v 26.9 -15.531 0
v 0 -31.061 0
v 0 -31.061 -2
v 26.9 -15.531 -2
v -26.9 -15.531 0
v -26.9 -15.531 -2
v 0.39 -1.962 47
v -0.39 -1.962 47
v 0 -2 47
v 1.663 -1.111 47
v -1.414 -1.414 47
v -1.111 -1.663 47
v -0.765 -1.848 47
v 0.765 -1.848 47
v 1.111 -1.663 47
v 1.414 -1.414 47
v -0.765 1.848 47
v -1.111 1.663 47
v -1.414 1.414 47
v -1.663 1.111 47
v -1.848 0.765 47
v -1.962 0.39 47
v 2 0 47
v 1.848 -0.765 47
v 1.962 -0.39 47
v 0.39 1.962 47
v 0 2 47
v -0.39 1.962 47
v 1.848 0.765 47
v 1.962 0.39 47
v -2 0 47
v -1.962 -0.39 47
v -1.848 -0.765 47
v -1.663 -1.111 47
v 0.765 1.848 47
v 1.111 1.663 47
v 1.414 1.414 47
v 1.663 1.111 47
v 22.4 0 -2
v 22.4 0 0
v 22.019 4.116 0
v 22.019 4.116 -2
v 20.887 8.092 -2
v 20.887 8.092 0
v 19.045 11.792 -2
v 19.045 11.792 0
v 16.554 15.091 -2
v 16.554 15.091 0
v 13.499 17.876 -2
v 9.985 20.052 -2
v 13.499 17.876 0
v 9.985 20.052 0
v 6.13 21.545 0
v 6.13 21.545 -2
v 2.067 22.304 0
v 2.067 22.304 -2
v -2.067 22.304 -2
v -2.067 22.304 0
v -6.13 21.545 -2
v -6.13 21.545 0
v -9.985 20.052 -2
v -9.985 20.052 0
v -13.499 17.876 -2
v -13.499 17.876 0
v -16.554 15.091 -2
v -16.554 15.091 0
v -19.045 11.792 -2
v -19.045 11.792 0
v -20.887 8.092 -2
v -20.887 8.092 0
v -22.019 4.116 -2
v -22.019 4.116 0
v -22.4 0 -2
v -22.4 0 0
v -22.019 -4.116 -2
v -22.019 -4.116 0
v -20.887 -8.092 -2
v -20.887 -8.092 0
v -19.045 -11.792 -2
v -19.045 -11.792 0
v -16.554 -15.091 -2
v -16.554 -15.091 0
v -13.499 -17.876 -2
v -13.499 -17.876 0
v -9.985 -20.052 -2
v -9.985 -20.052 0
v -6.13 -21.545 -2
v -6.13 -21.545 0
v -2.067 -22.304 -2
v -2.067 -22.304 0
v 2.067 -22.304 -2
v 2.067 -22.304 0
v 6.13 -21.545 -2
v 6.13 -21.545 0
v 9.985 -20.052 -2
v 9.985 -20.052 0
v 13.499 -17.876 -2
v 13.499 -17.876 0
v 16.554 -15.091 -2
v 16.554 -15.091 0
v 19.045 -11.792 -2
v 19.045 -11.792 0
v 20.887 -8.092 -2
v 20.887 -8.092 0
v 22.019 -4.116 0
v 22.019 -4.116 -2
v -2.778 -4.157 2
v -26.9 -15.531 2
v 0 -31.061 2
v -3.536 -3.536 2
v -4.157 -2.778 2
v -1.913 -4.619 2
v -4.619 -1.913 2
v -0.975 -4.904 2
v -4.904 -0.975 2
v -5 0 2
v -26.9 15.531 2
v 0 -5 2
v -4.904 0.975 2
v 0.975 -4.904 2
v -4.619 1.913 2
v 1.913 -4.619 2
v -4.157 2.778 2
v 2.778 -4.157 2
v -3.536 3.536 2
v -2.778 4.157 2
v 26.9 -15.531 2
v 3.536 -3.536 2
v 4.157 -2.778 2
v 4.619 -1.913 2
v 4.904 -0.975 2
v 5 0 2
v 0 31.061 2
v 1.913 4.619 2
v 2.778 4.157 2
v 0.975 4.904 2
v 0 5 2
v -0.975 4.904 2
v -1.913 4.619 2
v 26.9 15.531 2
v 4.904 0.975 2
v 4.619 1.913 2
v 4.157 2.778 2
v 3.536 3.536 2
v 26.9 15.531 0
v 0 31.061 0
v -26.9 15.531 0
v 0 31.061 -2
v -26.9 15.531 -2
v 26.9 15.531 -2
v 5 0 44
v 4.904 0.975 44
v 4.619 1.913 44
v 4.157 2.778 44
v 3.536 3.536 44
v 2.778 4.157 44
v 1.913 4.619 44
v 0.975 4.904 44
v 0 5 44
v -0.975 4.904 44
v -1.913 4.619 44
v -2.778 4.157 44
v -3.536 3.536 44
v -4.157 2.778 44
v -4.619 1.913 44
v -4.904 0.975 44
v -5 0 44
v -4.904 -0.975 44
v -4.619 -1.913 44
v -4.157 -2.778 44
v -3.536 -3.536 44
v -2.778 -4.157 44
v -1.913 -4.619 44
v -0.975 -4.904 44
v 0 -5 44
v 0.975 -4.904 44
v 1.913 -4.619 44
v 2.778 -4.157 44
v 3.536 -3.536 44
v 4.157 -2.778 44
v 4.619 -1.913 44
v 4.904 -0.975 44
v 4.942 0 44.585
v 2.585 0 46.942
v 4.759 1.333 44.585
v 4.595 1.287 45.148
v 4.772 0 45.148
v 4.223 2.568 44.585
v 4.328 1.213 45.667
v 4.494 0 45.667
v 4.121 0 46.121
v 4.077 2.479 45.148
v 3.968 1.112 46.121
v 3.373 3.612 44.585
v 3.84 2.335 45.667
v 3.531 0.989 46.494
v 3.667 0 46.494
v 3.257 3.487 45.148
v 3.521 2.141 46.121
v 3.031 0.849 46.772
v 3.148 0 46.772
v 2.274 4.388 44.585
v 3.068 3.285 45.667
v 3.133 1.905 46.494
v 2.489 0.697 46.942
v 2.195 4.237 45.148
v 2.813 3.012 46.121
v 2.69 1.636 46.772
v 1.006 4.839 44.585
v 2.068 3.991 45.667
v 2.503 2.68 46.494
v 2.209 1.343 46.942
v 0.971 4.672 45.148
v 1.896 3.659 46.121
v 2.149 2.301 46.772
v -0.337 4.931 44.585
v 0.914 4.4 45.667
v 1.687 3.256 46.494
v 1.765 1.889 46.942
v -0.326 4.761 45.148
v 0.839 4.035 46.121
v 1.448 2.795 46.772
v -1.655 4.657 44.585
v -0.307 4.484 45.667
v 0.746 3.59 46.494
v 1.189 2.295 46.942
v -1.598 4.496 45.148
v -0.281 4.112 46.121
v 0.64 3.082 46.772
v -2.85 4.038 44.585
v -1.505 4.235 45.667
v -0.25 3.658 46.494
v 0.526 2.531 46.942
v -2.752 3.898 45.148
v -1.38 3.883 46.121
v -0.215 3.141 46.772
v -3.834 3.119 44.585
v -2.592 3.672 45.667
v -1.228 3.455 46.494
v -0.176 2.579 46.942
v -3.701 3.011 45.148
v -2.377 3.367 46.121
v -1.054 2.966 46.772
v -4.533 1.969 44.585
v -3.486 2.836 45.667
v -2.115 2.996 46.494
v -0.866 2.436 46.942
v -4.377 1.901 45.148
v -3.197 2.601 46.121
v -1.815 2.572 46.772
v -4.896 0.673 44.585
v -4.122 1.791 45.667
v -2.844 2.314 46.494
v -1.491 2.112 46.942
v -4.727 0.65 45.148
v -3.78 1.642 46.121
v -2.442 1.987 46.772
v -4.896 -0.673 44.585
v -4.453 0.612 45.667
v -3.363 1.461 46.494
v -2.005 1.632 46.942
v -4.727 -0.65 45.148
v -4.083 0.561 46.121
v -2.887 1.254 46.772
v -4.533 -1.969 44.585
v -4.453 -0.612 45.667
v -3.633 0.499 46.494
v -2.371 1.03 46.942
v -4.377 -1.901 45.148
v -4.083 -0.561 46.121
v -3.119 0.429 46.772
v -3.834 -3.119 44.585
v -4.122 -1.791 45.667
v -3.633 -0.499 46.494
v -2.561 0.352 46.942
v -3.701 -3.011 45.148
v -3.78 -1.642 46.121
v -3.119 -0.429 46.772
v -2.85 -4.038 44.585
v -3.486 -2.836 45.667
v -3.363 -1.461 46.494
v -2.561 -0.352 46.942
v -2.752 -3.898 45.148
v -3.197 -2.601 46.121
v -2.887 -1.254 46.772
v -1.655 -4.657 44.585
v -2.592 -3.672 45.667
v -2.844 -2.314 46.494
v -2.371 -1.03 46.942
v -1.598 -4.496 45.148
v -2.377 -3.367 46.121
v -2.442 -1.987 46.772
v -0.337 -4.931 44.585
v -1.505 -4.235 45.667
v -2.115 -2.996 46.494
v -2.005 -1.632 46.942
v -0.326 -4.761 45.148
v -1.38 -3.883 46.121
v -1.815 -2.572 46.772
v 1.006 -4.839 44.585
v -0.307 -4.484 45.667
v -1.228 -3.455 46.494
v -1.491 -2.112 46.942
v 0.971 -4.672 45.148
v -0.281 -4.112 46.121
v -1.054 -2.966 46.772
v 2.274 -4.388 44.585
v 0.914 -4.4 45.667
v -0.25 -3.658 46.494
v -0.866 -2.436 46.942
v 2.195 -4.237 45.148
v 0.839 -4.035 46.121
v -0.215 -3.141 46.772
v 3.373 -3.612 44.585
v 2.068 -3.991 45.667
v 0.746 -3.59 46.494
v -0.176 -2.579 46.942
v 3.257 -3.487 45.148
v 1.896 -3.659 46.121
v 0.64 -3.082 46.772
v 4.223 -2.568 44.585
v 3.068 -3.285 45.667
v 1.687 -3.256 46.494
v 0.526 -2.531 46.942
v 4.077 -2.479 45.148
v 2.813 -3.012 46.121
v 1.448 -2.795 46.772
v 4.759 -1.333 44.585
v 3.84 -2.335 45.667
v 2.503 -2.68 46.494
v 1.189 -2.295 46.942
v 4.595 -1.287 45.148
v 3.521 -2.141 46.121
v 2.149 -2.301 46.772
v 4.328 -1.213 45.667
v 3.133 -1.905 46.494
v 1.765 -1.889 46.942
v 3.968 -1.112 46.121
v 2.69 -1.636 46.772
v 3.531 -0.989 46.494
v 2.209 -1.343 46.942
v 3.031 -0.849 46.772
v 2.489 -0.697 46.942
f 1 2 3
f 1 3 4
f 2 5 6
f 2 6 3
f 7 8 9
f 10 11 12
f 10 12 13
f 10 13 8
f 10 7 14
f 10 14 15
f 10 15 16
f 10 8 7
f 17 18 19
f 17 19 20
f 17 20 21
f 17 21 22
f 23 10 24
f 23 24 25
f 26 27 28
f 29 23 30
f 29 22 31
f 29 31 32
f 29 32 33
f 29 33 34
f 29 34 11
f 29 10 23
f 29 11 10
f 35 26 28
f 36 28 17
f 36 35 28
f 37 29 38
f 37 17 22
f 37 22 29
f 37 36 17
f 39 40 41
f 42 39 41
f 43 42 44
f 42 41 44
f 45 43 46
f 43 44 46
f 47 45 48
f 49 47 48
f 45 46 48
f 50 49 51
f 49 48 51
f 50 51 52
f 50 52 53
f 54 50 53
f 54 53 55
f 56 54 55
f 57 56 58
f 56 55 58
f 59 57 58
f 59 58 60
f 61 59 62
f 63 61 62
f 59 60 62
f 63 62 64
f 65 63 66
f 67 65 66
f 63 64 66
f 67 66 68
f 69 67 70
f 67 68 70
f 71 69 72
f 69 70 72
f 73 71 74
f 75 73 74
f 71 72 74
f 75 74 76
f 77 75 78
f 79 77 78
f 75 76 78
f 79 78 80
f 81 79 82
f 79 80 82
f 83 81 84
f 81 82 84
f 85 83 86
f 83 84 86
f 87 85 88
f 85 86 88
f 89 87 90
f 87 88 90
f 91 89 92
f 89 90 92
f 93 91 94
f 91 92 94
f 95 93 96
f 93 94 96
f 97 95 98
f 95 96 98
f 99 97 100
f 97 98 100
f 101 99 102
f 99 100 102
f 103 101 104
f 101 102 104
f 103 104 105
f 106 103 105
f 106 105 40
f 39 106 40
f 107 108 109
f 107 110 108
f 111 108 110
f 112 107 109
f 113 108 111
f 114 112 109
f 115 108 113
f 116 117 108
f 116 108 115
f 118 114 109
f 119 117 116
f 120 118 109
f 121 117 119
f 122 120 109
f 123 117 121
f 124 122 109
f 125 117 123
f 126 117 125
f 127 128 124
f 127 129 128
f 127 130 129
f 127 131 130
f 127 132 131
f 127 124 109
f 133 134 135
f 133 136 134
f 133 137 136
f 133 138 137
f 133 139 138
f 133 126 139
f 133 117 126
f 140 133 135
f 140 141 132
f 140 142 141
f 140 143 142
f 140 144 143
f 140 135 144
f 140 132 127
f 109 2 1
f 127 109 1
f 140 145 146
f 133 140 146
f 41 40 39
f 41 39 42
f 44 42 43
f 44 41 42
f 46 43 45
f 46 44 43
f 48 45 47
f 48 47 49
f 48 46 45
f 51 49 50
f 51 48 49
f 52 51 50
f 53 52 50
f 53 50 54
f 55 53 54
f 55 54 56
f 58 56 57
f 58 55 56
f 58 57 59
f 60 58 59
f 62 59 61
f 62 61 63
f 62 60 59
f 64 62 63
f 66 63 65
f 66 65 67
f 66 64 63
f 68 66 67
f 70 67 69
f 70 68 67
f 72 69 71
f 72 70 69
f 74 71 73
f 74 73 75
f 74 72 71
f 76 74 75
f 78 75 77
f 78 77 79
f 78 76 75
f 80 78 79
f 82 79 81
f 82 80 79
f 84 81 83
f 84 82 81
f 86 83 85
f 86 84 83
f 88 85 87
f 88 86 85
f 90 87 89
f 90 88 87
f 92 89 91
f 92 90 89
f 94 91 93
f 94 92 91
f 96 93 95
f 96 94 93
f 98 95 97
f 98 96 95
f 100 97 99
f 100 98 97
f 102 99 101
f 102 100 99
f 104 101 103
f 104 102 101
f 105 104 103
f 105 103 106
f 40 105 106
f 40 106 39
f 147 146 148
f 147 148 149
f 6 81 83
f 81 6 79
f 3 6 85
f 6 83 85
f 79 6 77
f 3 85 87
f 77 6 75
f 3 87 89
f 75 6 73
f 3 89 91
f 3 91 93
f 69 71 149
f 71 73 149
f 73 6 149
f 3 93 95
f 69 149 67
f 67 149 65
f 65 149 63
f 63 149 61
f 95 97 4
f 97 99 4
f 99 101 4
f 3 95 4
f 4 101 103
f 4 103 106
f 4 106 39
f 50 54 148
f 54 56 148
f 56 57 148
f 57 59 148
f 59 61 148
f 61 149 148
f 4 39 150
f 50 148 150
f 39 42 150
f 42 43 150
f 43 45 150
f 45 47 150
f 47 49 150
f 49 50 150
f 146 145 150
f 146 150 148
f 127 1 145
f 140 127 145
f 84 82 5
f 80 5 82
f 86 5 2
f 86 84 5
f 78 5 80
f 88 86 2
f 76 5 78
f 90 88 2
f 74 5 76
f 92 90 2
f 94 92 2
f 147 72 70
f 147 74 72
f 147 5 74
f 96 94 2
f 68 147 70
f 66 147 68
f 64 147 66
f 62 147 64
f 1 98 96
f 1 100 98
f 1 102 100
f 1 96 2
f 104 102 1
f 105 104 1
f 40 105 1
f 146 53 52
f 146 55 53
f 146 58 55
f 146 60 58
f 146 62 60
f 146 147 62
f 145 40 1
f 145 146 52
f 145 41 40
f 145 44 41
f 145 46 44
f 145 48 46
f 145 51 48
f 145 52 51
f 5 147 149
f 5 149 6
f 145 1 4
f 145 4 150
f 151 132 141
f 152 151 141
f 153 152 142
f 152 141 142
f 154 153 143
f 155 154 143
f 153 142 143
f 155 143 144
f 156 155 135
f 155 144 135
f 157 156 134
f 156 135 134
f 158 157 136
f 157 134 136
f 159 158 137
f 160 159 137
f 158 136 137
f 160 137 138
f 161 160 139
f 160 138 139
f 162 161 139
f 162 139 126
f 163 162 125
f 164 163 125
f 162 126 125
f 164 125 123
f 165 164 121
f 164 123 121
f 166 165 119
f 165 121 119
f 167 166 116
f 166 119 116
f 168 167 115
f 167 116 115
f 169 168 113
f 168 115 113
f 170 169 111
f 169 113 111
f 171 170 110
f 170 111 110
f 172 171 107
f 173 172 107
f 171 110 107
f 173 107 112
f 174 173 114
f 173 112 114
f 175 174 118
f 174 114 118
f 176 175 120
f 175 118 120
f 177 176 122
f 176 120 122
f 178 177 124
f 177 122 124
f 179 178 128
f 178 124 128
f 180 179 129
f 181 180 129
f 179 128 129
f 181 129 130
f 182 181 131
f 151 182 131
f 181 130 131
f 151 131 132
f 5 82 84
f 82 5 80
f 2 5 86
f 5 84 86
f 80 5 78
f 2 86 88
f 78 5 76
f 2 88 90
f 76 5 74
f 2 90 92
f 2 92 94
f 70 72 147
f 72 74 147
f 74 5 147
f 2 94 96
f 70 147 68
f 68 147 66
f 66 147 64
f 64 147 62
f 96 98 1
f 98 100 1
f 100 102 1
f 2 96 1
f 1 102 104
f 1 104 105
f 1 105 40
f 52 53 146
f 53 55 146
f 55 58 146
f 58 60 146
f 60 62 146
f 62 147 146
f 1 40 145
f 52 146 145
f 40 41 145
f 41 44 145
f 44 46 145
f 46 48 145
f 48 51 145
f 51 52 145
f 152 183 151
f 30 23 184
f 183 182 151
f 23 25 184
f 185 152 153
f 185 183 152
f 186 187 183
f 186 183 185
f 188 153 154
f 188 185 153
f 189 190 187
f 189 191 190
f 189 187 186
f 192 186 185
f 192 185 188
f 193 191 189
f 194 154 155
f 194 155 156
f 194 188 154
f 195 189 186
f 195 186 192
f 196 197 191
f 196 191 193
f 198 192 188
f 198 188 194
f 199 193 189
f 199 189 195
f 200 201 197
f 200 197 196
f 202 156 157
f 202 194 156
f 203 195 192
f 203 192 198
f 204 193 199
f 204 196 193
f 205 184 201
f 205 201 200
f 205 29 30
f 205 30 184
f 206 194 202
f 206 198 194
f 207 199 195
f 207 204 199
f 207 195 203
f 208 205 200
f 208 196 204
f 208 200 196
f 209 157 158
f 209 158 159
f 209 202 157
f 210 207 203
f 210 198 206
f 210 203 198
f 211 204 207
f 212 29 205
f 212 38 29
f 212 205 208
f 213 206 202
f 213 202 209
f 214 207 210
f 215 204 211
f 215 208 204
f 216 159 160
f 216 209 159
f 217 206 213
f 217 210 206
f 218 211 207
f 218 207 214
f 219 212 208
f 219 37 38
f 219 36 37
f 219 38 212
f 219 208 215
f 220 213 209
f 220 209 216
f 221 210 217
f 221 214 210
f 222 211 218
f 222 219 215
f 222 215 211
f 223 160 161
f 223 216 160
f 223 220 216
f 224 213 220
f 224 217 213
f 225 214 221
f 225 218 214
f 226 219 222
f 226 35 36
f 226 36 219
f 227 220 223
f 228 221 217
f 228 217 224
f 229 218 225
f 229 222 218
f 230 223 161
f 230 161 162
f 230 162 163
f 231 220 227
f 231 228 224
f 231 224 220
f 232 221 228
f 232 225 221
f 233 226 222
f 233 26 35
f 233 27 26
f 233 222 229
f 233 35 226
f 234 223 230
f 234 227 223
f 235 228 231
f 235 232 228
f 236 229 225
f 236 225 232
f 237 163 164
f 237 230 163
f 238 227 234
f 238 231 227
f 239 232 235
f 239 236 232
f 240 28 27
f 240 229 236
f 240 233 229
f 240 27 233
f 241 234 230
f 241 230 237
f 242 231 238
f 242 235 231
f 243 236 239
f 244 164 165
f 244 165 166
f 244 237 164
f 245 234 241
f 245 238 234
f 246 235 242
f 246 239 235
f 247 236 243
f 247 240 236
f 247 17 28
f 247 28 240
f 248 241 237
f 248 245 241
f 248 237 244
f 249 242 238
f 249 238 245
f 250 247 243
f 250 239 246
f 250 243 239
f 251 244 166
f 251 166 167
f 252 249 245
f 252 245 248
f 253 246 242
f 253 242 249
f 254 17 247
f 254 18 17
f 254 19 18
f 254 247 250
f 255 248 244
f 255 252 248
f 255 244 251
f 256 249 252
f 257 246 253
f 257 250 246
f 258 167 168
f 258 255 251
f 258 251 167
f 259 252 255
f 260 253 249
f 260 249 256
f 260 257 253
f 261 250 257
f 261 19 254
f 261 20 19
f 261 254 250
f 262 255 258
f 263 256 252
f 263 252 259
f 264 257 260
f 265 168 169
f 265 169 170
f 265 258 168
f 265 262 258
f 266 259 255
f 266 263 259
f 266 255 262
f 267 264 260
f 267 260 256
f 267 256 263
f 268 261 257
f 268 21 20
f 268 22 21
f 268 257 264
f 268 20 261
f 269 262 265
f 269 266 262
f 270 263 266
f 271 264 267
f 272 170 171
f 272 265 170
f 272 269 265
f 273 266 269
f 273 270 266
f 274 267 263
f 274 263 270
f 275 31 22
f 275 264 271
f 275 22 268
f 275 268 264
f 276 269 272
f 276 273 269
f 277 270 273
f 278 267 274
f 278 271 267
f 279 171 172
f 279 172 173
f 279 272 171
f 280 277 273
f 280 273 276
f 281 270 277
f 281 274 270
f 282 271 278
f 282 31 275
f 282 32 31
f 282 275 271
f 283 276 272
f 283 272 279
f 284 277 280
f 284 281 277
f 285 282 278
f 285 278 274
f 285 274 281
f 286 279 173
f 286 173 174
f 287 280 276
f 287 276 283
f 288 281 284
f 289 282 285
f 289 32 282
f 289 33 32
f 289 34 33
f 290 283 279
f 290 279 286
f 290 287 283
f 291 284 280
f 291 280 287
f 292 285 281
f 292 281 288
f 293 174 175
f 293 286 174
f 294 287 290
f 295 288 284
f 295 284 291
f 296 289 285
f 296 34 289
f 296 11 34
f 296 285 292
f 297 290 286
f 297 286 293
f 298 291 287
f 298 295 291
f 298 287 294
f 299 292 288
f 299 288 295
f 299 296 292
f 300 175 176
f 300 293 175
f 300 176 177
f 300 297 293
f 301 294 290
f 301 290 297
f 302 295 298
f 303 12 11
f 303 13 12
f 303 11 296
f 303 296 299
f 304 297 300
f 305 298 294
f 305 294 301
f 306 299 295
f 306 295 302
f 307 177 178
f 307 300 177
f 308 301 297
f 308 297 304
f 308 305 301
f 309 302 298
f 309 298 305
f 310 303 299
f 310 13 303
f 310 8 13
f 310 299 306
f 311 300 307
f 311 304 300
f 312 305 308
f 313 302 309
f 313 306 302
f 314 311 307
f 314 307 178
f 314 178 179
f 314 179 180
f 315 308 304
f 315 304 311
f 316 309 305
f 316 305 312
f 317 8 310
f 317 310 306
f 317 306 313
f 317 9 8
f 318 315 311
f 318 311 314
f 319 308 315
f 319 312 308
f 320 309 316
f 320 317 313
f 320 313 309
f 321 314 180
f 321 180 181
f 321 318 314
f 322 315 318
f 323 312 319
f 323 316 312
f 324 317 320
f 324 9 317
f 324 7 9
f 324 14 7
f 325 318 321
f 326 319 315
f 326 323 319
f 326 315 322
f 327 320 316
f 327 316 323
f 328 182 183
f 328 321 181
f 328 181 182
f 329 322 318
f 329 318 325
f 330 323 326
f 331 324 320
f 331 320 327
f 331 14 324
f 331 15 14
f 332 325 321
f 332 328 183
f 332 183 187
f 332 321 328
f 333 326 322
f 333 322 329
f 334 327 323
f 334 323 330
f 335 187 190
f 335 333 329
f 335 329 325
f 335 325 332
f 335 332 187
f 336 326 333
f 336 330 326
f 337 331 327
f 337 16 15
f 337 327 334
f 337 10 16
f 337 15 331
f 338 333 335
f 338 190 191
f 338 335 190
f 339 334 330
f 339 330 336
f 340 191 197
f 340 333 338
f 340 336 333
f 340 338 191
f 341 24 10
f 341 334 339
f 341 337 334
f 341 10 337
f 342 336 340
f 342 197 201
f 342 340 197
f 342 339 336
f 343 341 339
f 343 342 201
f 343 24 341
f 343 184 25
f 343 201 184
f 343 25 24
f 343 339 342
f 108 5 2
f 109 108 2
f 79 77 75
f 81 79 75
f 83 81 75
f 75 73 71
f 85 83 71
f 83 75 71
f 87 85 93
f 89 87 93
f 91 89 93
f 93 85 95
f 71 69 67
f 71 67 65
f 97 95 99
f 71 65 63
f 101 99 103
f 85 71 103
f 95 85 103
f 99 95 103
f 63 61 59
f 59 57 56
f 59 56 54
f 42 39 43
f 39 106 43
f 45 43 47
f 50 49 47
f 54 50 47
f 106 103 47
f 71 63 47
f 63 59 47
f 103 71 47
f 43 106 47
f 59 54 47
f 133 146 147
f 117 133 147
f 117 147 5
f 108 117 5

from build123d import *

# Parameters (mm, degrees)
F0_R     = 22.4
F1_DEPTH = 2
F2_R     = 5
F3_DEPTH = 45
F4_R     = 3
F5_DEPTH = 2
F6_DEPTH = 2


# Not quite as in the source:
# - a feature names something its author has since deleted; it is built from what else it names


with BuildPart() as f1:
    # F0 (on Top) → F1 (new body)
    with BuildSketch(Plane.XY):
        Polygon((26.9, -15.5307222412), (26.9, 15.5307222412), (0, 31.0614444824), (-26.9, 15.5307222412), (-26.9, -15.5307222412), (0, -31.0614444824), align=None)
        Circle(F0_R, mode=Mode.SUBTRACT)
        Circle(F0_R)
    extrude(amount=F1_DEPTH)

    # F2 (on face) → F3 (join)
    with BuildSketch(Plane.XY.offset(2)):
        Circle(F2_R)
    extrude(amount=F3_DEPTH)

    # F4
    f4_edges = [f1.edges().sort_by_distance(p)[0] for p in [
        (-5, 0, 47),
    ]]
    fillet(f4_edges, radius=F4_R)

    # F0 (on Top) → F5 (join)
    with BuildSketch(Plane.XY):
        Circle(F0_R)
    extrude(amount=-F5_DEPTH)


with BuildPart() as f6:
    # F0 (on Top) → F6 (new body)
    with BuildSketch(Plane.XY):
        Polygon((26.9, -15.5307222412), (26.9, 15.5307222412), (0, 31.0614444824), (-26.9, 15.5307222412), (-26.9, -15.5307222412), (0, -31.0614444824), align=None)
        Circle(F0_R, mode=Mode.SUBTRACT)
    extrude(amount=-F6_DEPTH)


solid = Compound([f1.part, f6.part])
